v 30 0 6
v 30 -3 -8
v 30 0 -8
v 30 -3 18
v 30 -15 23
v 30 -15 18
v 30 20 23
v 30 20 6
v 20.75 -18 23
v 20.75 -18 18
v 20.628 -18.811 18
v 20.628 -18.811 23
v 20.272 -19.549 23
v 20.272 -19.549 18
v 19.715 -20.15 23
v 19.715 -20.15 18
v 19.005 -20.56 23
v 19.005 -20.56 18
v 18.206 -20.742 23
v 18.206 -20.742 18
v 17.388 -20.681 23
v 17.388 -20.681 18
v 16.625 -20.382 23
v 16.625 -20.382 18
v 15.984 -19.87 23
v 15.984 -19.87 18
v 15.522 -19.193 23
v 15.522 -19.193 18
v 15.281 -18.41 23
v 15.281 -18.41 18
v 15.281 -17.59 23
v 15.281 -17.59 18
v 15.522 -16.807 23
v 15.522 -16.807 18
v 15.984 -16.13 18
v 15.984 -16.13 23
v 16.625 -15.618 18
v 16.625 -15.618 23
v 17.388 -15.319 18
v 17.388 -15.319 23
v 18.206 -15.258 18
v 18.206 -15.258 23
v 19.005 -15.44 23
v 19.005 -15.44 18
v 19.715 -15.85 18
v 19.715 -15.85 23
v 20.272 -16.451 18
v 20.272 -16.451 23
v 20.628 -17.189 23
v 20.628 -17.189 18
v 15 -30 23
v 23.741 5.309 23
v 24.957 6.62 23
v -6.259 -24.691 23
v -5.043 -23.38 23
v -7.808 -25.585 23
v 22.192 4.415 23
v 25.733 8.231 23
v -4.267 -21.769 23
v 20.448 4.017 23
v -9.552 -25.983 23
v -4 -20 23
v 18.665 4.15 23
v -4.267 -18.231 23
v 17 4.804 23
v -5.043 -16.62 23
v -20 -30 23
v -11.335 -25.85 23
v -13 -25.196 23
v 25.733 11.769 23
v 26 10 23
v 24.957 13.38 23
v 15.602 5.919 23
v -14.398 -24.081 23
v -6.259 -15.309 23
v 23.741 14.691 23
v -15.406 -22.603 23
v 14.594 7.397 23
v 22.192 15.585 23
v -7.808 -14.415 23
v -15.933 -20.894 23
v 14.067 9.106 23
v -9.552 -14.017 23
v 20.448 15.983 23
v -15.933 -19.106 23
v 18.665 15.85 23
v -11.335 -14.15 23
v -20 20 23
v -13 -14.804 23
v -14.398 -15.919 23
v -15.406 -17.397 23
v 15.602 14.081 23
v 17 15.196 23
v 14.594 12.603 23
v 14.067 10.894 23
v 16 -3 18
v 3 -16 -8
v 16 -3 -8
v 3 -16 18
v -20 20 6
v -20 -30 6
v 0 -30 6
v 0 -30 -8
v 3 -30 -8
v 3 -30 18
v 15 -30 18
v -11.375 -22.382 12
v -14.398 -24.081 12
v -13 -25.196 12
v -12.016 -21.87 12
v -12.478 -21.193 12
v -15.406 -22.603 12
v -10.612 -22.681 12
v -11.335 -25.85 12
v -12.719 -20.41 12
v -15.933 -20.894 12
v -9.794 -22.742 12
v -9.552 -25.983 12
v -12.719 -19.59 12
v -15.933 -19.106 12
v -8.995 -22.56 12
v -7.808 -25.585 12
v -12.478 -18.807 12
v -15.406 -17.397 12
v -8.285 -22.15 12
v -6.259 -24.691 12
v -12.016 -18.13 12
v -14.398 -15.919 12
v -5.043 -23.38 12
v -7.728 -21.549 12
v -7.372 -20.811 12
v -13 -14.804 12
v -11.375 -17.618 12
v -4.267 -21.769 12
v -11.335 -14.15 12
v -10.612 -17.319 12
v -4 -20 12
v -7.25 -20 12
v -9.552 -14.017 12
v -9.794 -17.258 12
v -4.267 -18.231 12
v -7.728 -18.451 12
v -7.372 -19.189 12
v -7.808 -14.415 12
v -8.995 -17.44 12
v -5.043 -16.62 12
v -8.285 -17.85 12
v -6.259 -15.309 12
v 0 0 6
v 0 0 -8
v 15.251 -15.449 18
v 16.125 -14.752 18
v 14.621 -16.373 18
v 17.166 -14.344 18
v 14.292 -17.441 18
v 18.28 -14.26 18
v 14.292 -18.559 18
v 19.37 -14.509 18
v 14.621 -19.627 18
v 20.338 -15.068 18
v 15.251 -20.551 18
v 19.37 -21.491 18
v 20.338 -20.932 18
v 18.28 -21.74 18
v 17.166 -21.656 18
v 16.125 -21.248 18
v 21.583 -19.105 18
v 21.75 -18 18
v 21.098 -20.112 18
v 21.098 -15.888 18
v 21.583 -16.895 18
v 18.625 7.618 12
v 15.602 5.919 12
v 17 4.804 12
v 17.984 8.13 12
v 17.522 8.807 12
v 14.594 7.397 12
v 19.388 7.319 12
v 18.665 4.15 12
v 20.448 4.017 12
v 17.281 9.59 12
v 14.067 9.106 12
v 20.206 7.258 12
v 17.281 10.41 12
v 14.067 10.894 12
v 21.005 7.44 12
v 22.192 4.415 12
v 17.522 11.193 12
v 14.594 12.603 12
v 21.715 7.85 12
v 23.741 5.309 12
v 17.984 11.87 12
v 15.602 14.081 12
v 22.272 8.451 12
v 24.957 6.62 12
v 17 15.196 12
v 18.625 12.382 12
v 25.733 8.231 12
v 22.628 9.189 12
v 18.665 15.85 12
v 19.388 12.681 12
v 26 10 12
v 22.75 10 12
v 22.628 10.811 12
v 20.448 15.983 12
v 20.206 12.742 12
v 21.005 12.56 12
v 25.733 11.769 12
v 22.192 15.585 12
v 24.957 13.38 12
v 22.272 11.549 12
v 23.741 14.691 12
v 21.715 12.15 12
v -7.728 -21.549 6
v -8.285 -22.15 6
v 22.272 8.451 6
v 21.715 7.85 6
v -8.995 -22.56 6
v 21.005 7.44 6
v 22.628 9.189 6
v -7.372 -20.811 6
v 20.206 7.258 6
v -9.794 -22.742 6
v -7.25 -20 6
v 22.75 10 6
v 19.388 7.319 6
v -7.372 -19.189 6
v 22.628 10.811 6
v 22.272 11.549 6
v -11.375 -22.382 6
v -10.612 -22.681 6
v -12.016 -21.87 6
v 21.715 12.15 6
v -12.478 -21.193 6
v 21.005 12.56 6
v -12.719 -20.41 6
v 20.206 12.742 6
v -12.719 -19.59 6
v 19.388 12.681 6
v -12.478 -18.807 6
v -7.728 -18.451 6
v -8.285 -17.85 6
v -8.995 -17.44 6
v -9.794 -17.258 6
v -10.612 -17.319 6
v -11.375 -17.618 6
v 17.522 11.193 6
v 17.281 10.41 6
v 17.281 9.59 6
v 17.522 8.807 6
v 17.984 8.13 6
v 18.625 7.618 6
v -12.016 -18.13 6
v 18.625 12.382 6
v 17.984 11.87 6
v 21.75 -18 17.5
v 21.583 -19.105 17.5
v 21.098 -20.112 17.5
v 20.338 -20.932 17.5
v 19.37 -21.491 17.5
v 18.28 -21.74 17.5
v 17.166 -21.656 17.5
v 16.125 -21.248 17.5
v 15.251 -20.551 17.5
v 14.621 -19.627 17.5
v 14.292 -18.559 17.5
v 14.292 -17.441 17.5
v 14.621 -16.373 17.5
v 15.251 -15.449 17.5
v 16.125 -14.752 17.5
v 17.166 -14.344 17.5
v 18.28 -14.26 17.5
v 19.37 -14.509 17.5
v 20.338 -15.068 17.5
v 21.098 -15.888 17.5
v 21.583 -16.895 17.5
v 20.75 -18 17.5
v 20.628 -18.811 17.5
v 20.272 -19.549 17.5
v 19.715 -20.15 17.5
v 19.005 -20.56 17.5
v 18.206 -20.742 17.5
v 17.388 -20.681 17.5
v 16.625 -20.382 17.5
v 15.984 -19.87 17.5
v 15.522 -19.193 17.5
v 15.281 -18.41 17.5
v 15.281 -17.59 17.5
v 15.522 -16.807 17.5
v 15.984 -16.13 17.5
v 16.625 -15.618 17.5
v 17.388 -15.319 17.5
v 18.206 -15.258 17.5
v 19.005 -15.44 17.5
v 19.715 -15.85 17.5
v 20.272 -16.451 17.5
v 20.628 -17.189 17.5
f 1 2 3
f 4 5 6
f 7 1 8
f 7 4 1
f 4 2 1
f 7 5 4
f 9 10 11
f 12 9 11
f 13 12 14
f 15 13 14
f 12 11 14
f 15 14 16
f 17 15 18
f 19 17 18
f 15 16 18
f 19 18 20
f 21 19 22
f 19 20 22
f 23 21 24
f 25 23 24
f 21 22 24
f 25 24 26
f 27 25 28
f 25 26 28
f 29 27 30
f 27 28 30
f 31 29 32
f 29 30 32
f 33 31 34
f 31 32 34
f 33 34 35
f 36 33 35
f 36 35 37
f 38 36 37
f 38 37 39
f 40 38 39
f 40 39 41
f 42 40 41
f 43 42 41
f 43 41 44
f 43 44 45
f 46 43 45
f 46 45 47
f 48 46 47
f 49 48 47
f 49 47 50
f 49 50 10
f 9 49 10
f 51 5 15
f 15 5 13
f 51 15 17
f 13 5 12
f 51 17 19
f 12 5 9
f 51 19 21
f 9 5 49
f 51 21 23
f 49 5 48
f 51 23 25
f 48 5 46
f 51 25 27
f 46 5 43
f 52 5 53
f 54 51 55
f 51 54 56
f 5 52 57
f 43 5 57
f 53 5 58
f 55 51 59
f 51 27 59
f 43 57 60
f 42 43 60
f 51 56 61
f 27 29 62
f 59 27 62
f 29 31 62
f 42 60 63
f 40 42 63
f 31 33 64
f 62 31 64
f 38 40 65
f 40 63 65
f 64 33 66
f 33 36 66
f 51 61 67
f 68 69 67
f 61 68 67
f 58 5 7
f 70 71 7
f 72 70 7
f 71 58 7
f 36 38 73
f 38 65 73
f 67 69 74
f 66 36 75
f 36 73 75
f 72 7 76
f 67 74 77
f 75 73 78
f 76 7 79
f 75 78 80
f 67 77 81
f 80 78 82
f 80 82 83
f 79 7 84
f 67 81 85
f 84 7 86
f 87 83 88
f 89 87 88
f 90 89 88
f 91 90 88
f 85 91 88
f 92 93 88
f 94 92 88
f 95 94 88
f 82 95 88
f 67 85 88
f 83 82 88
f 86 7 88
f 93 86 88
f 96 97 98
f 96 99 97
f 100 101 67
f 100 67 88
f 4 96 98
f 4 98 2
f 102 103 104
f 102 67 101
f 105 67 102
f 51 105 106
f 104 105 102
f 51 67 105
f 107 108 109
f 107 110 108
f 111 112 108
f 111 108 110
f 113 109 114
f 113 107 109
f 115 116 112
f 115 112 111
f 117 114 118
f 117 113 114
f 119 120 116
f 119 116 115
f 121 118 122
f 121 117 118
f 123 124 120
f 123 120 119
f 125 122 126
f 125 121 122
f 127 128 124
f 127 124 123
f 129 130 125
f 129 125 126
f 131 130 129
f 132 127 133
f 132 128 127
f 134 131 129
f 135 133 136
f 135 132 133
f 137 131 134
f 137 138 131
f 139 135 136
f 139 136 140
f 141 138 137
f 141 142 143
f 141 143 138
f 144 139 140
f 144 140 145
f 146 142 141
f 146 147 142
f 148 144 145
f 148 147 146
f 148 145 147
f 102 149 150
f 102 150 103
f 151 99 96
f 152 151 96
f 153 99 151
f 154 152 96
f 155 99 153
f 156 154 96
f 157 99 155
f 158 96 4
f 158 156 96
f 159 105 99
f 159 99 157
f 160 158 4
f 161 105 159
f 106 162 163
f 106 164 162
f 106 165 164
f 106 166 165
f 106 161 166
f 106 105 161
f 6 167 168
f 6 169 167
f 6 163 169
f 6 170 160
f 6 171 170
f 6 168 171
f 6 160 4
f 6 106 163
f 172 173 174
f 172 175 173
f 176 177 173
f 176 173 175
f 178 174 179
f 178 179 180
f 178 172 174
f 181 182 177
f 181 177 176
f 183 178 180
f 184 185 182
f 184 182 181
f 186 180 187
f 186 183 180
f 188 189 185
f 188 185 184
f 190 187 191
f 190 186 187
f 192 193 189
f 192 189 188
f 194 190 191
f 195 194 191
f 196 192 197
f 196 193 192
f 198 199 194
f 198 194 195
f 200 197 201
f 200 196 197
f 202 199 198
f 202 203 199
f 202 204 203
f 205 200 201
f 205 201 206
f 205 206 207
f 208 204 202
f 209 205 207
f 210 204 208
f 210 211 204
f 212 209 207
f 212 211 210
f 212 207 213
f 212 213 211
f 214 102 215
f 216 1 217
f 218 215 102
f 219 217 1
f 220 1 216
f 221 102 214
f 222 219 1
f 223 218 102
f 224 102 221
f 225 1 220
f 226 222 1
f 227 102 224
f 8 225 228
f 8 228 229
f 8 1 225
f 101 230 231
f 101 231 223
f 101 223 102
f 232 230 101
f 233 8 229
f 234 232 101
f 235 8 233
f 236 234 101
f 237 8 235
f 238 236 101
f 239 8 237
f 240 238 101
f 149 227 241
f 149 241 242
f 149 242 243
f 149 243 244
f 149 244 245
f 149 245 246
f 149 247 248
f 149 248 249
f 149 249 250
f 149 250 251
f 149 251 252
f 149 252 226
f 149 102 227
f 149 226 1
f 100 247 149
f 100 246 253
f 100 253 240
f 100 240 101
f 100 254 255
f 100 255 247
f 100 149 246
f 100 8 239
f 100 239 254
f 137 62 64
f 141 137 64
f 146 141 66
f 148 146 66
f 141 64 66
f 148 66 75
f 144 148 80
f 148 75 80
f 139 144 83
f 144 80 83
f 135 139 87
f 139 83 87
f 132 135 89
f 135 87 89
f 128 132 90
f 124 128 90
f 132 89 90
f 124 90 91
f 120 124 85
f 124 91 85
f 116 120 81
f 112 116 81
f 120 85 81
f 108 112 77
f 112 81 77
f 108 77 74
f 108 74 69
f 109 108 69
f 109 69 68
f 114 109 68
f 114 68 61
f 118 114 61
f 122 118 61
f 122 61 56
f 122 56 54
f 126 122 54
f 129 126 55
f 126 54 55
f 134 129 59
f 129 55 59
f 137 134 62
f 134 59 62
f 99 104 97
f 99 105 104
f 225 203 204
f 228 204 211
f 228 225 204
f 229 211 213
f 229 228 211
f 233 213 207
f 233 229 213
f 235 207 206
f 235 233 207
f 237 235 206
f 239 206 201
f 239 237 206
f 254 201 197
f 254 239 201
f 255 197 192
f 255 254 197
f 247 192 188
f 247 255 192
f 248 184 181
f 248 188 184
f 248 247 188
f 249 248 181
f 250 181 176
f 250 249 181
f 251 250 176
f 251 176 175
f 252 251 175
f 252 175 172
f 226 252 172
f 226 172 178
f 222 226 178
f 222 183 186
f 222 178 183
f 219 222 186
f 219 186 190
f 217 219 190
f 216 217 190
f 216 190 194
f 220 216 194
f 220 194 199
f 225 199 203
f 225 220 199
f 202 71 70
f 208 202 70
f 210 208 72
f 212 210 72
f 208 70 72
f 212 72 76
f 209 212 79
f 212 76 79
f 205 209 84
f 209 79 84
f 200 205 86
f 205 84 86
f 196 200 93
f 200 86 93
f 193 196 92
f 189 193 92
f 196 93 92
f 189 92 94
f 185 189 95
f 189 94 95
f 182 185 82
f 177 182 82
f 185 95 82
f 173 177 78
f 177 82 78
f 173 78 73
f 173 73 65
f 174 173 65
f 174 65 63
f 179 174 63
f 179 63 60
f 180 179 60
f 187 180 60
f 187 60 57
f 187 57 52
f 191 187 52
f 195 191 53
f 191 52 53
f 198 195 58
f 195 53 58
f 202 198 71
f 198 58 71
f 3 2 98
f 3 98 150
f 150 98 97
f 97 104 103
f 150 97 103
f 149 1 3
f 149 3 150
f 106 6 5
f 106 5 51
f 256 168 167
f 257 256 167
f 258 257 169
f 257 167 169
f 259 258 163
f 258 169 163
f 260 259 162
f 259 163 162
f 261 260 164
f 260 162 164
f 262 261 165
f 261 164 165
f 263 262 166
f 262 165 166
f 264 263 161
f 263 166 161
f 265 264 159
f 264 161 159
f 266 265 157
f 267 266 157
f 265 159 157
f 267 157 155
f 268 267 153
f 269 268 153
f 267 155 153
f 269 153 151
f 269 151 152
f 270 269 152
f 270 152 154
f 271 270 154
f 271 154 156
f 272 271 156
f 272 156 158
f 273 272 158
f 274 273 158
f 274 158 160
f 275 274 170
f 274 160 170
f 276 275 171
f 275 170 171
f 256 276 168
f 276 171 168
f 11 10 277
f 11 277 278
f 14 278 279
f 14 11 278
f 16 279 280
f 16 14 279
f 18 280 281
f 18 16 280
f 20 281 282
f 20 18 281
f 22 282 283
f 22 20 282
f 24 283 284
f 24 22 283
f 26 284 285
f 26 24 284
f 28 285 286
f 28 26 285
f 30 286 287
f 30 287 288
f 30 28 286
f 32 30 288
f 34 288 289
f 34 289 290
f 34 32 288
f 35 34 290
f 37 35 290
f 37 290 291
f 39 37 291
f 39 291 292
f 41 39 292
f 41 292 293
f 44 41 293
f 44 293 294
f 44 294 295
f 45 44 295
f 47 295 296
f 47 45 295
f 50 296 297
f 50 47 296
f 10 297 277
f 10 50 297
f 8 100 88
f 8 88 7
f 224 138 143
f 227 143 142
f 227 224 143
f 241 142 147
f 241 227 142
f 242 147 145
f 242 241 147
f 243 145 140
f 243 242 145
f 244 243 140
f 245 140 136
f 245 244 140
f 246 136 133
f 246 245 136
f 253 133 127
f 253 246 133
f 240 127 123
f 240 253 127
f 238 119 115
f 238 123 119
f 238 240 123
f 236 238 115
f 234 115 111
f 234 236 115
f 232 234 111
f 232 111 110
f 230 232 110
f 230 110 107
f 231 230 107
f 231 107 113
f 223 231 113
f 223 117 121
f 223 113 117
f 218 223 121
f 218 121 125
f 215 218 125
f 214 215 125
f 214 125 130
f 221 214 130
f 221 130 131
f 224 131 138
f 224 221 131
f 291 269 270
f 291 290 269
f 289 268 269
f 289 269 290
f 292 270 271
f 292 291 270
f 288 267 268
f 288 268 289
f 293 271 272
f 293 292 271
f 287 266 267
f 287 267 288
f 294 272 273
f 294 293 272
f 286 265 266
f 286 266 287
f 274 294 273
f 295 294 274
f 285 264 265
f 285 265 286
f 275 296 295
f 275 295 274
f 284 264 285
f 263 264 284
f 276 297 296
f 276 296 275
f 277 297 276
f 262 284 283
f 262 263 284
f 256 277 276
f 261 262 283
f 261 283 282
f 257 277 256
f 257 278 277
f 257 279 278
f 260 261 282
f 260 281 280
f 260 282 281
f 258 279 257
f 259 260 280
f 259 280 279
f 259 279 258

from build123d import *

# Parameters (mm, degrees)
SKETCH001_R     = 2.75
PAD001_DEPTH    = 17
POCKET_DEPTH    = 12
SKETCH002_R     = 2.75
POCKET001_DEPTH = 5.001
SKETCH004_R     = 3.75
SKETCH004_R_2   = 2.75
PAD_DEPTH       = 0.5
PAD002_DEPTH    = 14
SKETCH006_R     = 6
POCKET002_DEPTH = 11


with BuildPart() as part:
    # Sketch001 → Pad001 (new body)
    with BuildSketch(Plane.XY.offset(6)):
        Polygon((15, -30), (-20, -30), (-20, 20), (30, 20), (30, -15), align=None)
        with Locations((-10, -20)):
            Circle(SKETCH001_R, mode=Mode.SUBTRACT)
        with Locations((20, 10)):
            Circle(SKETCH001_R, mode=Mode.SUBTRACT)
    extrude(amount=PAD001_DEPTH)

    # Sketch (on Face8 of Pad001) → Pocket (cut)
    with BuildSketch(Plane(origin=(0, 0, 6), x_dir=(1, 0, 0), z_dir=(0, 0, -1))):
        Polygon((15, 30), (3, 30), (3, 16), (16, 3), (30, 3), (30, 15), align=None)
    extrude(amount=-POCKET_DEPTH, mode=Mode.SUBTRACT)

    # Sketch002 (on Face2 of Pocket) → Pocket001 (cut, through all)
    with BuildSketch(Plane(origin=(0, 0, 18), x_dir=(1, 0, 0), z_dir=(0, 0, -1))):
        with Locations((18, 18)):
            Circle(SKETCH002_R)
    extrude(amount=-POCKET001_DEPTH, mode=Mode.SUBTRACT)

    # Sketch004 (on Face2 of Pocket001) → Pad (join)
    with BuildSketch(Plane(origin=(0, 0, 18), x_dir=(1, 0, 0), z_dir=(0, 0, -1))):
        with Locations((18, 18)):
            Circle(SKETCH004_R)
        with Locations((18, 18)):
            Circle(SKETCH004_R_2, mode=Mode.SUBTRACT)
    extrude(amount=PAD_DEPTH)

    # Sketch005 (on Face4 of Pad) → Pad002 (join)
    with BuildSketch(Plane(origin=(0, 0, 6), x_dir=(1, 0, 0), z_dir=(0, 0, -1))):
        Polygon((3, 16), (16, 3), (30, 3), (30, 0), (0, 0), (0, 30), (3, 30), align=None)
    extrude(amount=PAD002_DEPTH)

    # Sketch006 (on Face5 of Pad002) → Pocket002 (cut)
    with BuildSketch(Plane.XY.offset(23)):
        with Locations((20, 10)):
            Circle(SKETCH006_R)
        with Locations((-10, -20)):
            Circle(SKETCH006_R)
    extrude(amount=-POCKET002_DEPTH, mode=Mode.SUBTRACT)


solid = part.part
